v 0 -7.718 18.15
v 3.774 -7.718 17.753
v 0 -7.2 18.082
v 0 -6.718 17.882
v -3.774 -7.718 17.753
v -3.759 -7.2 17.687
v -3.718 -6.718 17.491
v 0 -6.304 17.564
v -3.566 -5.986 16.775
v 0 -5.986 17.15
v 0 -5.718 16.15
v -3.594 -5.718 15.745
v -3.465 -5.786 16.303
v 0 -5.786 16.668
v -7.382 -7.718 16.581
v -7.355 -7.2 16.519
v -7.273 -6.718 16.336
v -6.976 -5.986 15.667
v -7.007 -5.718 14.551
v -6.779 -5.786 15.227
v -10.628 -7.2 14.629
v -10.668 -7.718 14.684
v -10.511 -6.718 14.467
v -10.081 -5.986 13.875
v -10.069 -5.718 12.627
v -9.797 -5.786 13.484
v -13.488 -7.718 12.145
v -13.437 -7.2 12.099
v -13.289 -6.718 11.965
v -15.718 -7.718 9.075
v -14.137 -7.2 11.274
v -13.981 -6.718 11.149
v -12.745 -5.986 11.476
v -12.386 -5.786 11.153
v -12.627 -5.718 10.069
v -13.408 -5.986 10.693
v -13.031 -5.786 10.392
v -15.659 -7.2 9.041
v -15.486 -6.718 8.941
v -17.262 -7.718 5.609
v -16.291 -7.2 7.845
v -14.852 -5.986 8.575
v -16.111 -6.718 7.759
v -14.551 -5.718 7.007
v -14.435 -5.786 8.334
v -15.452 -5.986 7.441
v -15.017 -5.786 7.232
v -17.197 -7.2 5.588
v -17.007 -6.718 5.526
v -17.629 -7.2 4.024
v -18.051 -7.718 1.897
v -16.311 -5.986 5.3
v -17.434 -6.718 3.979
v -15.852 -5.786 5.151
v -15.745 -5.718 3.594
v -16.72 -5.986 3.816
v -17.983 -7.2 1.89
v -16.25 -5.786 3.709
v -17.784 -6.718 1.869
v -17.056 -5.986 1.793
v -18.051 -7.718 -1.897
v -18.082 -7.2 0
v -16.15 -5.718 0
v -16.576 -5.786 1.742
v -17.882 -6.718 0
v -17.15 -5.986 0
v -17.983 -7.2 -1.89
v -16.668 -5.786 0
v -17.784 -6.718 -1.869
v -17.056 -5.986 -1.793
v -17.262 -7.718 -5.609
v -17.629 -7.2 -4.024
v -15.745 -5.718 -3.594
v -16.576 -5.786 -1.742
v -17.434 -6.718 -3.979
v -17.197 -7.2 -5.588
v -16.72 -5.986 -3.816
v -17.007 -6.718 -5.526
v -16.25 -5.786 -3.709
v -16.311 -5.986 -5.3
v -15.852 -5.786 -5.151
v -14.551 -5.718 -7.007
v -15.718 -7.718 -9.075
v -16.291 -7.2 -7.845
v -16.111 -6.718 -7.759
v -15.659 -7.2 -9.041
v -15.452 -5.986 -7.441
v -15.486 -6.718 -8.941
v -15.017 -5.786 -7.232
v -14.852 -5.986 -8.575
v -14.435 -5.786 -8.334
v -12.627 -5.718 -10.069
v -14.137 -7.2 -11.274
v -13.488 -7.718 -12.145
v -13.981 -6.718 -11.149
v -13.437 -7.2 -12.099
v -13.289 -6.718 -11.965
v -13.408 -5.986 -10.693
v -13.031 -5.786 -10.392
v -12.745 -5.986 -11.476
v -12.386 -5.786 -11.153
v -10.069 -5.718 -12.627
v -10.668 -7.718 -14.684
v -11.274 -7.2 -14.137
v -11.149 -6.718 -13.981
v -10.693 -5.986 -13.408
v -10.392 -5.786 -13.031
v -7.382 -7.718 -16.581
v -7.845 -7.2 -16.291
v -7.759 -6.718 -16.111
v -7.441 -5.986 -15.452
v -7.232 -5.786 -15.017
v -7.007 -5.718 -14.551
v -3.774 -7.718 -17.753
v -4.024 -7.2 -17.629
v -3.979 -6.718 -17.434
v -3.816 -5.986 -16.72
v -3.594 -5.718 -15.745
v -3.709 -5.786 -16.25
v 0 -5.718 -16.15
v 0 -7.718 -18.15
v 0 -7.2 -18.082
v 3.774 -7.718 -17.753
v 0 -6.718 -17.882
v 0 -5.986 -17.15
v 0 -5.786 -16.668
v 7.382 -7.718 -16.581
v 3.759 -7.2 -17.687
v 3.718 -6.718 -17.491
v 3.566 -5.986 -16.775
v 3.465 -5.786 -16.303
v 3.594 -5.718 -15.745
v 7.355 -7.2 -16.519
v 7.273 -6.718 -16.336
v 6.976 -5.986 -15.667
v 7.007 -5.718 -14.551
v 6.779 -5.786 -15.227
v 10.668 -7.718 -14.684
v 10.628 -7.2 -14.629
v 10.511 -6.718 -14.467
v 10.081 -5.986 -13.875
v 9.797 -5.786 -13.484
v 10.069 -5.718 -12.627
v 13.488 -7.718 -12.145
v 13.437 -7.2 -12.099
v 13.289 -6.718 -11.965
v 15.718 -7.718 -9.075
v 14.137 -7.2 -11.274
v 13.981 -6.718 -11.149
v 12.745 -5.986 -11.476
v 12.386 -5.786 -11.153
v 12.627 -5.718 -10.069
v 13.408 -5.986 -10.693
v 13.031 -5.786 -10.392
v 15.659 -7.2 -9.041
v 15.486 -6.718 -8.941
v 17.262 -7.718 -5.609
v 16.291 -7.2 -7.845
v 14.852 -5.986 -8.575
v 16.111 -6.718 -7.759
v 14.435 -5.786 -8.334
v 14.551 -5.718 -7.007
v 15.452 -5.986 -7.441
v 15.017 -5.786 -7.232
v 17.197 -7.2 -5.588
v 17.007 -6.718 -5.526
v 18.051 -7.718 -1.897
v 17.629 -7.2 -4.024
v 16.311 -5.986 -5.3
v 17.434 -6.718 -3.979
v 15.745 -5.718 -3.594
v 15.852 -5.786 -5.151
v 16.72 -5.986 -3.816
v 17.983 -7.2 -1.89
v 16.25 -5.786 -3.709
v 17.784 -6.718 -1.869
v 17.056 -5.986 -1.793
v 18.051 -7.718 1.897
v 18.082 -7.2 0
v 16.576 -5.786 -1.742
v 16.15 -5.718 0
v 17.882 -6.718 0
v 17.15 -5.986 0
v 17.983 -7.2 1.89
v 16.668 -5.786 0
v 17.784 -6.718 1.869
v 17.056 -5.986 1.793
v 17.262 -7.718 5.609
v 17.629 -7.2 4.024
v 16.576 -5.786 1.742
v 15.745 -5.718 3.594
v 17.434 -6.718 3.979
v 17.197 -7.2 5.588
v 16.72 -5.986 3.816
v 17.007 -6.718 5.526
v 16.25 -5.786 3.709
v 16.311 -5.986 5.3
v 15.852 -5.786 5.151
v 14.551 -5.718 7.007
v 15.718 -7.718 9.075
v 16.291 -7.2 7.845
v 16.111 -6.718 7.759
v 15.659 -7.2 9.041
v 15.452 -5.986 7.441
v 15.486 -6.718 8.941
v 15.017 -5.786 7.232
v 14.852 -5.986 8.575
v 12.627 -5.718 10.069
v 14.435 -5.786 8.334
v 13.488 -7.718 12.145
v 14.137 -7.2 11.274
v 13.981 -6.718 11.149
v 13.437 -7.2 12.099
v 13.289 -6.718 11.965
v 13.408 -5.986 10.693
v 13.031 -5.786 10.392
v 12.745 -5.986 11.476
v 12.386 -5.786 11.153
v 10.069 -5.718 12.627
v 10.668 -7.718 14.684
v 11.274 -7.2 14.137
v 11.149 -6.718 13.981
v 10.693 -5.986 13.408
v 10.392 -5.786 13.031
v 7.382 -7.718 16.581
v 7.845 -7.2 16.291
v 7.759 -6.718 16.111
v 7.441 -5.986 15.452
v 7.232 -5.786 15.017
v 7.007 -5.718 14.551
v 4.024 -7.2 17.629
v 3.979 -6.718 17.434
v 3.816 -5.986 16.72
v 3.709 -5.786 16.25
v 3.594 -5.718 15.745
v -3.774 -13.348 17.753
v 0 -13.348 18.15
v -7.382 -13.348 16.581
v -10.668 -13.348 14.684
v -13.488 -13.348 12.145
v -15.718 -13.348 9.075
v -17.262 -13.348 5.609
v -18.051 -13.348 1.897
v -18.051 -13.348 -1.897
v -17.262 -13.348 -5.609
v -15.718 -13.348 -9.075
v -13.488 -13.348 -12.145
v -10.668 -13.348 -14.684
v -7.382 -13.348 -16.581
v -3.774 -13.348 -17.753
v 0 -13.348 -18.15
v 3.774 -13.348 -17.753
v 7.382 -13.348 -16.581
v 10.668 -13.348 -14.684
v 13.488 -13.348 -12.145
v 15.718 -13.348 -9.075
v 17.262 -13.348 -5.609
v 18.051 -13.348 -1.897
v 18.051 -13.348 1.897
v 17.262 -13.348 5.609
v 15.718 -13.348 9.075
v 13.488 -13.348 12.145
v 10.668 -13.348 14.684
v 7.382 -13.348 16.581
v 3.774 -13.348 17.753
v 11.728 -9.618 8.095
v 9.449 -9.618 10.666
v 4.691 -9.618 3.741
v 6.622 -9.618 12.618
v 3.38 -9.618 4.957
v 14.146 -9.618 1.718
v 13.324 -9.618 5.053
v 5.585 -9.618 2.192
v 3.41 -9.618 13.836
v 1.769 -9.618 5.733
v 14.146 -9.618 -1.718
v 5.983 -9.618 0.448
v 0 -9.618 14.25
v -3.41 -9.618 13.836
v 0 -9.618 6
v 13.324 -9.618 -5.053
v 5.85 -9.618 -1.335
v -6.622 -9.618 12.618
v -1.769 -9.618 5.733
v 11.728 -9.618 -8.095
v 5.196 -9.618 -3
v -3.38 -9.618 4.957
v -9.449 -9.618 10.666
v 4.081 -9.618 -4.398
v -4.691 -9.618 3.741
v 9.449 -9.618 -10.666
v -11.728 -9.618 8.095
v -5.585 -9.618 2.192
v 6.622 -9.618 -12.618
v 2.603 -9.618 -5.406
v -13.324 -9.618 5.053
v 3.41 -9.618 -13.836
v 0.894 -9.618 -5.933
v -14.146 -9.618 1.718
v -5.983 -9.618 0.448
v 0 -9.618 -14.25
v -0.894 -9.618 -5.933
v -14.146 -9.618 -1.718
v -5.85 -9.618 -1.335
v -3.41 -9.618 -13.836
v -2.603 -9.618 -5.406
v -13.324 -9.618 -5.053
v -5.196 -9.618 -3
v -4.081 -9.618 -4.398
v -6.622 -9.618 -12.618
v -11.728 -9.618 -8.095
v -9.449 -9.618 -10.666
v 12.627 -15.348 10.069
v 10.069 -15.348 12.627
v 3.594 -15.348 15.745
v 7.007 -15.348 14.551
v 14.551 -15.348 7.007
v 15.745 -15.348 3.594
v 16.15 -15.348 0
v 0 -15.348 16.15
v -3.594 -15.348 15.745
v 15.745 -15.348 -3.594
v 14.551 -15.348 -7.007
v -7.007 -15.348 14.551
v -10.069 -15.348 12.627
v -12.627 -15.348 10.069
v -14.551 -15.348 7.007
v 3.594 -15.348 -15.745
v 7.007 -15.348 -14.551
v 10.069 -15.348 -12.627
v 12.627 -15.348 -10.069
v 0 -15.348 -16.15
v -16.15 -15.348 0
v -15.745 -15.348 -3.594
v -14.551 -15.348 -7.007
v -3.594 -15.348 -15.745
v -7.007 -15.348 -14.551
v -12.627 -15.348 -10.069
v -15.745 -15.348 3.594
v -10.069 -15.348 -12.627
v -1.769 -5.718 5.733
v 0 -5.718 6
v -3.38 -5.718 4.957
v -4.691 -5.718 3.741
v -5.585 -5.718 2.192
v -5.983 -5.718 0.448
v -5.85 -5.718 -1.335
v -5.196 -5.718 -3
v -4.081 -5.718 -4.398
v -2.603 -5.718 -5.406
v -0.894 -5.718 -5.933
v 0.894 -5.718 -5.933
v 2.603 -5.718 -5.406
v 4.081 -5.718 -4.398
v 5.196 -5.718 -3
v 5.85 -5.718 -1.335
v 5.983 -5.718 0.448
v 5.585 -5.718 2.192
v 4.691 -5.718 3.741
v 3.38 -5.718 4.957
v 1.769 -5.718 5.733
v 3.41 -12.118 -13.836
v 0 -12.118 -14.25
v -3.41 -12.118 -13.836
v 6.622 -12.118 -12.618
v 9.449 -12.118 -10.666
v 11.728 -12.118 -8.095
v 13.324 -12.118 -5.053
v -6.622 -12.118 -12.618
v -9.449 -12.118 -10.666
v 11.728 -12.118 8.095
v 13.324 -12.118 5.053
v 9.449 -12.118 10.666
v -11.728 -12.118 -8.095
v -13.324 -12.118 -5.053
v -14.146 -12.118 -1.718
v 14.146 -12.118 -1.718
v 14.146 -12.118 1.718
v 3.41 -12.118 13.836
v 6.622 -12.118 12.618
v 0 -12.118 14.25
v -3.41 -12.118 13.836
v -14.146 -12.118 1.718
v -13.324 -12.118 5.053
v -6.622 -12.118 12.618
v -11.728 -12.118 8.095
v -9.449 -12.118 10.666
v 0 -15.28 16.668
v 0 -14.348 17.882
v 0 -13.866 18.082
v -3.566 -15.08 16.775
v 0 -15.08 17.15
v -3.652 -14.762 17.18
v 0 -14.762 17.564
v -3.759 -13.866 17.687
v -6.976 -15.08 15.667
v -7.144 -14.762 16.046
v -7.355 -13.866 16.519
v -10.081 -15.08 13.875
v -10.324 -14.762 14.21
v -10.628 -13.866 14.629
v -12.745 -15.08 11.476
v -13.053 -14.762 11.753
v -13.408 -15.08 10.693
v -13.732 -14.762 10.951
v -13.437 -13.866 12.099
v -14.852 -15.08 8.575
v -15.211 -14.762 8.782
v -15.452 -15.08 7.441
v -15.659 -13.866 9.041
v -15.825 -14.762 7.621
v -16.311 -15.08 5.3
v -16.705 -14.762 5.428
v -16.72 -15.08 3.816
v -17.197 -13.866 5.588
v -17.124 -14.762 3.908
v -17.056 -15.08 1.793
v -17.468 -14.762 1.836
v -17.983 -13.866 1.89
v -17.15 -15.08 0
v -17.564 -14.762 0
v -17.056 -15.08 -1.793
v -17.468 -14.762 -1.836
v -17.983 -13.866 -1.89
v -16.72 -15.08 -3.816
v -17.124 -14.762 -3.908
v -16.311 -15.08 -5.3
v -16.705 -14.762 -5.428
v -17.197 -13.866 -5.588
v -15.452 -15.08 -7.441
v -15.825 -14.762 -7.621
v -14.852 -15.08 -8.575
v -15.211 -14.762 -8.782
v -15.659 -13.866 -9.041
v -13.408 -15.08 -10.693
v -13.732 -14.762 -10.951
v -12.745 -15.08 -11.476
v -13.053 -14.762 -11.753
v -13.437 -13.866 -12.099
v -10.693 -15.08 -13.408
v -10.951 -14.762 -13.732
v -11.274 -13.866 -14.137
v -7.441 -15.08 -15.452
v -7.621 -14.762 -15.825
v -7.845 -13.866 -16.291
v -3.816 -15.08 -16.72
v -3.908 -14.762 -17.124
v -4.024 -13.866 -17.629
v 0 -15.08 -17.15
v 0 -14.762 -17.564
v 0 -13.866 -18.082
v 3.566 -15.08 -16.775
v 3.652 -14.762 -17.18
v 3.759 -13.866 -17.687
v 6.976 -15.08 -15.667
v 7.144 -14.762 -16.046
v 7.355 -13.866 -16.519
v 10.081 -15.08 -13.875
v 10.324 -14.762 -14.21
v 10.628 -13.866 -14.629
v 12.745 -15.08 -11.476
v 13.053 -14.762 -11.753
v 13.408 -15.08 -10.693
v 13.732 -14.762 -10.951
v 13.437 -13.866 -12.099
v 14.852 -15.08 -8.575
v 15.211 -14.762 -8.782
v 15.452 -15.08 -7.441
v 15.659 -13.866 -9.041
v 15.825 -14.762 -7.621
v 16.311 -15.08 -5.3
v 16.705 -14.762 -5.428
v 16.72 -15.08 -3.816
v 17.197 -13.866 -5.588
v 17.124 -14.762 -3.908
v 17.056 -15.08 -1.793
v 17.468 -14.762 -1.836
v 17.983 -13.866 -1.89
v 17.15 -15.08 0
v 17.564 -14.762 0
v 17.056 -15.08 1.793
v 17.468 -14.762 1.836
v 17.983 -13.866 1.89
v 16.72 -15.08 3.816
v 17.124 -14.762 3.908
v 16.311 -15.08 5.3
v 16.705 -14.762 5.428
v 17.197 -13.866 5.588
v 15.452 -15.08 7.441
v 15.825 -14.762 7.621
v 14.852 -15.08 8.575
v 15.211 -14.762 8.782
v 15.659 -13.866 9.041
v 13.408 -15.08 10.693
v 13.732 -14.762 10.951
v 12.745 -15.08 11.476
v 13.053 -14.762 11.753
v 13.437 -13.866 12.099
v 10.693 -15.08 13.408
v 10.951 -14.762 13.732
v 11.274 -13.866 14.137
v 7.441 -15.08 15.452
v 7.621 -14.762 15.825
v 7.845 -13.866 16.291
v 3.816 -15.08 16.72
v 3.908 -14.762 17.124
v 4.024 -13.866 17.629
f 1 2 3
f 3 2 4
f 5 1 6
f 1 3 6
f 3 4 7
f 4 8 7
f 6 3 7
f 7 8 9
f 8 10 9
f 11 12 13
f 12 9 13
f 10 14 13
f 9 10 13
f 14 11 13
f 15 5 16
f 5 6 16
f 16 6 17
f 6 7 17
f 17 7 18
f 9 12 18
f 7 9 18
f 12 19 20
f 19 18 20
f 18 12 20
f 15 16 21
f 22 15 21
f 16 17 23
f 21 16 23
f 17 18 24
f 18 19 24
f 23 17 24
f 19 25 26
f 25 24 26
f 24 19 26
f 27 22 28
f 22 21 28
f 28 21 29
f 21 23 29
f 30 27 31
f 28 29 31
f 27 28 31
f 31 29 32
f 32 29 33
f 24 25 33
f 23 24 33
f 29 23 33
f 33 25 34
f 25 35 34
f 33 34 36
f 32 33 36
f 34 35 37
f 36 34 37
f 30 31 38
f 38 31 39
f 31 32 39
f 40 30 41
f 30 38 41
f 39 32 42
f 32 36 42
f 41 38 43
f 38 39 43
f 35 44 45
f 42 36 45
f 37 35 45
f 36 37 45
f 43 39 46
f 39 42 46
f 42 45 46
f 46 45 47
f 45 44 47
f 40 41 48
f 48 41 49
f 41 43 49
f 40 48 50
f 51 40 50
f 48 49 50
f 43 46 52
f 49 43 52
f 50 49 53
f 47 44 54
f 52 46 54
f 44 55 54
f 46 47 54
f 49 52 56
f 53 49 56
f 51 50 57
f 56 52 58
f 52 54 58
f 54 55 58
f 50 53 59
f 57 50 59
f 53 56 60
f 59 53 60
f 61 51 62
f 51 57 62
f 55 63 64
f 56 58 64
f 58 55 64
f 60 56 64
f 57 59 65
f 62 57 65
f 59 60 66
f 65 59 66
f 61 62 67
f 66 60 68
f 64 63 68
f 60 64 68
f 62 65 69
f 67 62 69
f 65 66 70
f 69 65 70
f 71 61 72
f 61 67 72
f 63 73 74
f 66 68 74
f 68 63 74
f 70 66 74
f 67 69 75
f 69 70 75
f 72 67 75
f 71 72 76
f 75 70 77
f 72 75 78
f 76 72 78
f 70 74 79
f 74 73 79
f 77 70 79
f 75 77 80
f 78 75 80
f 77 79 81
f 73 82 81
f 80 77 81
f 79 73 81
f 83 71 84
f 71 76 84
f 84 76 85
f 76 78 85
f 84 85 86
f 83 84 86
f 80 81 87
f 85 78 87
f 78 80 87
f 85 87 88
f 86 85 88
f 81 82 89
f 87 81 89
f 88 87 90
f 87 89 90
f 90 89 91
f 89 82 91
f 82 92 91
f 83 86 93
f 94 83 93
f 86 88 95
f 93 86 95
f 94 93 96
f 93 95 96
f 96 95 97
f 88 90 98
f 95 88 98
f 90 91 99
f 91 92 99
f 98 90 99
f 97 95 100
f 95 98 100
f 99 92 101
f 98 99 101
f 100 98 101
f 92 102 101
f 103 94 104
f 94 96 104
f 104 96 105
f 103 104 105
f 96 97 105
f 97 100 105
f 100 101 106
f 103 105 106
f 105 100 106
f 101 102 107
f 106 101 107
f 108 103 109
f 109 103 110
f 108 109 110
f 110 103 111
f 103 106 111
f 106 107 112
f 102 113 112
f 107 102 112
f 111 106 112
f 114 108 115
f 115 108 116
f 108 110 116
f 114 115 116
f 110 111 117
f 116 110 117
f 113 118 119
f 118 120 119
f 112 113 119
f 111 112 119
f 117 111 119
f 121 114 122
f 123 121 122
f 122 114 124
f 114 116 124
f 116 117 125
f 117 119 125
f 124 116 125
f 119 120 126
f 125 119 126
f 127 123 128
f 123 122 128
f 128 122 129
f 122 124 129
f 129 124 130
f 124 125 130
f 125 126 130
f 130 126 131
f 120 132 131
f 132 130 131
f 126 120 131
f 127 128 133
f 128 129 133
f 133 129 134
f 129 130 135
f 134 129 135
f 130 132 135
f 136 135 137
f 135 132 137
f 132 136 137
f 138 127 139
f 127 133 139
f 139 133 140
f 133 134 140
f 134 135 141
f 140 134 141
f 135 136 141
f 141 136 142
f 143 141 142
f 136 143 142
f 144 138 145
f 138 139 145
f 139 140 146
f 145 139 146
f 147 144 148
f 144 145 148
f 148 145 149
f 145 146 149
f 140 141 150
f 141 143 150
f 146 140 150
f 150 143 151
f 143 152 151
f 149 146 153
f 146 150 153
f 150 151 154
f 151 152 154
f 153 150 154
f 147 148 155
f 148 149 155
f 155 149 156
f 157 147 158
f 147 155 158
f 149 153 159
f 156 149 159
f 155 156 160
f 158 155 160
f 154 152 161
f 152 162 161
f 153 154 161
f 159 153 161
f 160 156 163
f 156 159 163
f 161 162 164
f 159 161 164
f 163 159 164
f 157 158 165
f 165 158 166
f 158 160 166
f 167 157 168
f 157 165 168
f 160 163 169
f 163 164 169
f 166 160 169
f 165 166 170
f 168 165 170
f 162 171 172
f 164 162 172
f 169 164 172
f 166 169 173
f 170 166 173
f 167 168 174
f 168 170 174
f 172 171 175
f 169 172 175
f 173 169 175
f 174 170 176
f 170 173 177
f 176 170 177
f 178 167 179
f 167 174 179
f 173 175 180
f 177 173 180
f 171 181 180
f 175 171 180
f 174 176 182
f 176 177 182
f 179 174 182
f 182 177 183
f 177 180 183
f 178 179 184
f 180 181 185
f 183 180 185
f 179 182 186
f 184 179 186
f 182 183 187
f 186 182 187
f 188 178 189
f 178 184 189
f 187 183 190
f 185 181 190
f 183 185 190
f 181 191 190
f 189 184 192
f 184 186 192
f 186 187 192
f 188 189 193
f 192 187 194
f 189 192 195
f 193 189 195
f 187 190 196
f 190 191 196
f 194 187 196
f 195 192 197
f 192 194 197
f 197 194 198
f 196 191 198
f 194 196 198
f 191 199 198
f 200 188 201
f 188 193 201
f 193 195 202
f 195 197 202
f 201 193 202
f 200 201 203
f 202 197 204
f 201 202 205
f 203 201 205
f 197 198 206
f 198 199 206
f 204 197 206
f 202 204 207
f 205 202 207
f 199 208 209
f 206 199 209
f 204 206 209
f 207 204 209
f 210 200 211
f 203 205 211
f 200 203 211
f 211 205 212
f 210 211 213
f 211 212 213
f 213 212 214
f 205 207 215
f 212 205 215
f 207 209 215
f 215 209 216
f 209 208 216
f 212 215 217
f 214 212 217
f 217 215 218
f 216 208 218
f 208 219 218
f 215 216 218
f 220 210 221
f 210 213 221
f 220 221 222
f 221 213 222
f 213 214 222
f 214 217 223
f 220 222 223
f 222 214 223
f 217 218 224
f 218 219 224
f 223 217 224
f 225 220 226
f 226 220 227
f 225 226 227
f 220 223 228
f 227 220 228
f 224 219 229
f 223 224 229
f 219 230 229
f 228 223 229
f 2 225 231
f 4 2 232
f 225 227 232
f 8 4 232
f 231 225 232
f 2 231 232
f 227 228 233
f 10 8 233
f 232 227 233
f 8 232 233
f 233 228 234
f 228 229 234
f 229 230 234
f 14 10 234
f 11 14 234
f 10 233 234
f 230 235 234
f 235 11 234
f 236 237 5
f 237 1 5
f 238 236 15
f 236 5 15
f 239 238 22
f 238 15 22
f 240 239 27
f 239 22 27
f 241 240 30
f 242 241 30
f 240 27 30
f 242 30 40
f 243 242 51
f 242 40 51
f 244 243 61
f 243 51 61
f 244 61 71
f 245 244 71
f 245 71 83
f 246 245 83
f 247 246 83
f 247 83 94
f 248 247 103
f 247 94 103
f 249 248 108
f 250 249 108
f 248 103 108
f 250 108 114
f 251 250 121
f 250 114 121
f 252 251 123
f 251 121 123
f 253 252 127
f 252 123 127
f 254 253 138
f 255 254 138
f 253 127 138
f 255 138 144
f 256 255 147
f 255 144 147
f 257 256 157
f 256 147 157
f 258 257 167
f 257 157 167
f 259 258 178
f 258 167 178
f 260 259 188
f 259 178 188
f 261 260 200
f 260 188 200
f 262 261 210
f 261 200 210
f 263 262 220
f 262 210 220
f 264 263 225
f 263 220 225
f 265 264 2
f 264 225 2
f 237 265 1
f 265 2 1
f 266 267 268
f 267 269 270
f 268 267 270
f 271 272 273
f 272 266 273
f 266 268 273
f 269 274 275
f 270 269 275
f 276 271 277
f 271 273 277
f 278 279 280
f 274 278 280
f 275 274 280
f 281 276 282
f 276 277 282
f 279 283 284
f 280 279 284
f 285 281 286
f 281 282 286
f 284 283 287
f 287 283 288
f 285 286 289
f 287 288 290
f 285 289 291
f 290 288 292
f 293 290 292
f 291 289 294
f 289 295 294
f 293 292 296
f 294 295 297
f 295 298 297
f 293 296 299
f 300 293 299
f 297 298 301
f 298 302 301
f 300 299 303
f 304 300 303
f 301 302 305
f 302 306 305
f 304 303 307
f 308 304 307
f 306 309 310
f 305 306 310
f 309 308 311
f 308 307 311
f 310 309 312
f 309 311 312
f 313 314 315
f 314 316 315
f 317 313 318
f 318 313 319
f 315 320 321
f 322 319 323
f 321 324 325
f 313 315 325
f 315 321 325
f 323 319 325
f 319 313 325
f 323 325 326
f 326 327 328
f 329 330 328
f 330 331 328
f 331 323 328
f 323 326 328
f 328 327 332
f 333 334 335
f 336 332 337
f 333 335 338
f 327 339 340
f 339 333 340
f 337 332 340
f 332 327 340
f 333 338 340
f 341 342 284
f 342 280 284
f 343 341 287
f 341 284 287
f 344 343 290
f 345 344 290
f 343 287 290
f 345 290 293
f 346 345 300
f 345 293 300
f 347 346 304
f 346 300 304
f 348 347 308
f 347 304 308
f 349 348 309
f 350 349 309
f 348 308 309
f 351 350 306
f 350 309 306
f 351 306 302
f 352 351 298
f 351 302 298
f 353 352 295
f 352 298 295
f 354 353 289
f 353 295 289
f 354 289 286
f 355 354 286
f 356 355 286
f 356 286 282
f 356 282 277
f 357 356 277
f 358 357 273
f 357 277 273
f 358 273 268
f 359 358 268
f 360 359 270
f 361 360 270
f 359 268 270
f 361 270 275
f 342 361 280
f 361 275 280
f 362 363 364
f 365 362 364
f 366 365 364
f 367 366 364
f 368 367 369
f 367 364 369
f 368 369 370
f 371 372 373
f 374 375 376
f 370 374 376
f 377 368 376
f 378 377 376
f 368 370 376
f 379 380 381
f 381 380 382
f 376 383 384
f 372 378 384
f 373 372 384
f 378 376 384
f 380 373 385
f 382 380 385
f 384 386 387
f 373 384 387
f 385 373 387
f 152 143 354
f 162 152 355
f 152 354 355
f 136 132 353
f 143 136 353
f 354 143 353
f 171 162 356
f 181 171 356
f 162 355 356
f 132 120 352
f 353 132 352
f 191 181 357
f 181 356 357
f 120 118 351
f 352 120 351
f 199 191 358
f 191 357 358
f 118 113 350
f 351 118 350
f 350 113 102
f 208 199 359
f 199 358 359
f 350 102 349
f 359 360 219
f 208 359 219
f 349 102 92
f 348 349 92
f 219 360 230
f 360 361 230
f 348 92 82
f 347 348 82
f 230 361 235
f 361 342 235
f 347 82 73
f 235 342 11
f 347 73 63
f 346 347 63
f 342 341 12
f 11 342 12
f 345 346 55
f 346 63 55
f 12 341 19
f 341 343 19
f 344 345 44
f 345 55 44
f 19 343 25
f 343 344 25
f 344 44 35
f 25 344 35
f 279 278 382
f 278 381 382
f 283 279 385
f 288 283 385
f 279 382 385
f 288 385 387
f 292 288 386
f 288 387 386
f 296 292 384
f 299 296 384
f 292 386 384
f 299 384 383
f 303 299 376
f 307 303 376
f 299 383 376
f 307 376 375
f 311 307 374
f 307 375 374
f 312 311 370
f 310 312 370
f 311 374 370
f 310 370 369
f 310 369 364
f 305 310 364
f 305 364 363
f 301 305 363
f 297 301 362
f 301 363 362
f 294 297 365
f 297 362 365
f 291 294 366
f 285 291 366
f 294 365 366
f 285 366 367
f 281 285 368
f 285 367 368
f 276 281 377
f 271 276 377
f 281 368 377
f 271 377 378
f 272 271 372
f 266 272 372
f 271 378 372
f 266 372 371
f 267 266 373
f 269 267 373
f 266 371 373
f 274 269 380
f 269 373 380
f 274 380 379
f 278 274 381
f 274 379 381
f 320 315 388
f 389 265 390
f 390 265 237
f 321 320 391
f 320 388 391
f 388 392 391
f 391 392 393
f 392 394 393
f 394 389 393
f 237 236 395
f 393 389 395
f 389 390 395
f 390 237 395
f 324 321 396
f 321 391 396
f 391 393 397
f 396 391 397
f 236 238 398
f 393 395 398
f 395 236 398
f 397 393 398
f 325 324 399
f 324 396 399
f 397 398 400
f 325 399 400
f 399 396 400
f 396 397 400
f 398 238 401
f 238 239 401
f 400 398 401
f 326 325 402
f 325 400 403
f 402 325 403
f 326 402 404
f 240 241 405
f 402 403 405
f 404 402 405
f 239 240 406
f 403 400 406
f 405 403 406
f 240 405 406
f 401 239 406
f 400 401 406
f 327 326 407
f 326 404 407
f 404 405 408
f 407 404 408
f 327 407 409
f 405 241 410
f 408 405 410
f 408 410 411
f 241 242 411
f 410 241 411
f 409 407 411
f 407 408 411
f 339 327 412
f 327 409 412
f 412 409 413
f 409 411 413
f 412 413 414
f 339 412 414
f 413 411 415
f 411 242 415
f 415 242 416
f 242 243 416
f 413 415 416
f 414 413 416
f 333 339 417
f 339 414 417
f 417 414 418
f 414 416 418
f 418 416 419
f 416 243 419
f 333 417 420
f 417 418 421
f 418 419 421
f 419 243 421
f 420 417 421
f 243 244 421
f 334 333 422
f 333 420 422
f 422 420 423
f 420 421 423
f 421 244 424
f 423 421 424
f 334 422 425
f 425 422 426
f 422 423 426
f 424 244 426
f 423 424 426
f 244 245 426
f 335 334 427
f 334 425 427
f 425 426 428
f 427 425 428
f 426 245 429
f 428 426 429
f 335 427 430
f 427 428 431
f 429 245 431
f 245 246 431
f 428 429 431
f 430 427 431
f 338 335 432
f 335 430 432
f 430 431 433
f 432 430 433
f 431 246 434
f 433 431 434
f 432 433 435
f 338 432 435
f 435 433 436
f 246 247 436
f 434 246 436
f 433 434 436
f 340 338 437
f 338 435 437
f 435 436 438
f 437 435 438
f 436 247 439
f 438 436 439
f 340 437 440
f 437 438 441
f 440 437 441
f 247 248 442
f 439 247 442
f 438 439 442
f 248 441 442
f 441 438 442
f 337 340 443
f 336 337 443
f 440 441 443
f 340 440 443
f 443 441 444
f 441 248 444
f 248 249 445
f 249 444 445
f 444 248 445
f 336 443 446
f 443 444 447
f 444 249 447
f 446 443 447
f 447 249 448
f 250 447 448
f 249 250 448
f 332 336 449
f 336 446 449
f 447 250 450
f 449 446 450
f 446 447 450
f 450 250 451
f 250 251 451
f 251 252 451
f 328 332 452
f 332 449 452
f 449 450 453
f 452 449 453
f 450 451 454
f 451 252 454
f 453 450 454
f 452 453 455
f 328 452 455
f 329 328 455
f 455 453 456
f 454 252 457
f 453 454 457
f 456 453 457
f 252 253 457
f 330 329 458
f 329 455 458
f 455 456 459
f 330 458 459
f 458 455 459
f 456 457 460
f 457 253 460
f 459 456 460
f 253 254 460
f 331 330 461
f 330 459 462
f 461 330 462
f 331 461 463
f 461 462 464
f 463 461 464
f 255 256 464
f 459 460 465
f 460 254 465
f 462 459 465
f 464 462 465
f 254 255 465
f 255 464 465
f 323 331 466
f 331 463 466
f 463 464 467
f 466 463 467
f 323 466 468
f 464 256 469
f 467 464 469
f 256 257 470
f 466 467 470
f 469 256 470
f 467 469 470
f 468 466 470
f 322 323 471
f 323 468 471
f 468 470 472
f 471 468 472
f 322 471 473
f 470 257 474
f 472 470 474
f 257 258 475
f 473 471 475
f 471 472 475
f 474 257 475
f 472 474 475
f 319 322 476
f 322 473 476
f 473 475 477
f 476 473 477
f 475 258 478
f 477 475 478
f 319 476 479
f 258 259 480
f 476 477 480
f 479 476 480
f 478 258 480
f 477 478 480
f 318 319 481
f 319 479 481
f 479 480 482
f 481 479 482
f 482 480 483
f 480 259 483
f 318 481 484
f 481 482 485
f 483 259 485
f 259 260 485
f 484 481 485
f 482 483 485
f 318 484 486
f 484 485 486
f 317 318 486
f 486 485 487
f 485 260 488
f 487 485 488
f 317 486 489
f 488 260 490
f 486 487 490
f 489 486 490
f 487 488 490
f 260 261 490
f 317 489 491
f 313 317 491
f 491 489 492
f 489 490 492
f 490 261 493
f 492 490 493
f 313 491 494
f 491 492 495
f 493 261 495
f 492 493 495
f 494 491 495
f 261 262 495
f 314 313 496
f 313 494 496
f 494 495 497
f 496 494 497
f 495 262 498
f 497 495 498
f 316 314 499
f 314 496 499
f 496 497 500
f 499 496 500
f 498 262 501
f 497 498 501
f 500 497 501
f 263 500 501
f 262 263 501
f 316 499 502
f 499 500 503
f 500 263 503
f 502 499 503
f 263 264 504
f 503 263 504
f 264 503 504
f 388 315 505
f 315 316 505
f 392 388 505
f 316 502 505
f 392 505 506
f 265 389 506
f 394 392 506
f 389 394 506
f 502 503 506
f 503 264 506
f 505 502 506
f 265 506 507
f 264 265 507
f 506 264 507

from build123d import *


with BuildPart() as part:
    # Sketch1 → Revolve1 (revolve)
    with BuildSketch(Plane(origin=(0, 0, 0), x_dir=(0, 0, -1), z_dir=(1, 0, 0))):
        with BuildLine():
            Line((0, -12.118048154), (0, -15.348048154))
            Line((0, -15.348048154), (-16.15, -15.348048154))
            ThreePointArc((-16.15, -15.348048154), (-17.564213562, -14.762261716), (-18.15, -13.348048154))
            Line((-18.15, -13.348048154), (-18.15, -7.718048154))
            ThreePointArc((-18.15, -7.718048154), (-17.564213562, -6.303834591), (-16.15, -5.718048154))
            Line((-16.15, -5.718048154), (-6, -5.718048154))
            Line((-6, -5.718048154), (-6, -9.618048154))
            Line((-6, -9.618048154), (-14.25, -9.618048154))
            Line((-14.25, -9.618048154), (-14.25, -12.118048154))
            Line((-14.25, -12.118048154), (0, -12.118048154))
        make_face()
    revolve(axis=Axis((0, 41.234250563, 0), (0, -1, 0)))


solid = part.part
